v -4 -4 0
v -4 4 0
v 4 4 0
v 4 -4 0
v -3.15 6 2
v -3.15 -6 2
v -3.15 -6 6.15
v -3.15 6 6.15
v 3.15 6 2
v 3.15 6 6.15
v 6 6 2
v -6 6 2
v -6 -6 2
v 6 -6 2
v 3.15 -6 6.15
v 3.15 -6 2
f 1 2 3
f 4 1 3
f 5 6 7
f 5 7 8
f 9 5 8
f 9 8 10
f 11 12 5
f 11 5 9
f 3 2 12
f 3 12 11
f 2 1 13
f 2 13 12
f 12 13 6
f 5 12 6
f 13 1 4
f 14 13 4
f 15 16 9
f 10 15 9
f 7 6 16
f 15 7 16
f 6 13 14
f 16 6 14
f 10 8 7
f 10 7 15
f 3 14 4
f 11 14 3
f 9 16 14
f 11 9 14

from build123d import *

# Parameters (mm, degrees)
F0_W     = 12
F0_H     = 12
F1_DEPTH = 2
F2_W     = 6.3
F2_H     = 12
F3_DEPTH = 4.15
F4_SIZE  = 1.99999


# Not quite as in the source:
# - a fillet or chamfer is up to 0.001 mm smaller than in the source, because OpenCascade refuses the exact size


with BuildPart() as f1:
    # F0 (on Top) → F1 (new body)
    with BuildSketch(Plane.XY):
        Rectangle(F0_W, F0_H)
    extrude(amount=F1_DEPTH)

    # F2 (on face) → F3 (join)
    with BuildSketch(Plane.XY.offset(2)):
        Rectangle(F2_W, F2_H)
    extrude(amount=F3_DEPTH)

    # F4 (size 2 in the source; OpenCascade refuses exactly that, so slightly less here)
    f4_edges = [f1.edges().sort_by_distance(p)[0] for p in [
        (6, 0, 0),
        (0, -6, 0),
        (-6, 0, 0),
        (0, 6, 0),
    ]]
    chamfer(f4_edges, length=F4_SIZE)


solid = f1.part
